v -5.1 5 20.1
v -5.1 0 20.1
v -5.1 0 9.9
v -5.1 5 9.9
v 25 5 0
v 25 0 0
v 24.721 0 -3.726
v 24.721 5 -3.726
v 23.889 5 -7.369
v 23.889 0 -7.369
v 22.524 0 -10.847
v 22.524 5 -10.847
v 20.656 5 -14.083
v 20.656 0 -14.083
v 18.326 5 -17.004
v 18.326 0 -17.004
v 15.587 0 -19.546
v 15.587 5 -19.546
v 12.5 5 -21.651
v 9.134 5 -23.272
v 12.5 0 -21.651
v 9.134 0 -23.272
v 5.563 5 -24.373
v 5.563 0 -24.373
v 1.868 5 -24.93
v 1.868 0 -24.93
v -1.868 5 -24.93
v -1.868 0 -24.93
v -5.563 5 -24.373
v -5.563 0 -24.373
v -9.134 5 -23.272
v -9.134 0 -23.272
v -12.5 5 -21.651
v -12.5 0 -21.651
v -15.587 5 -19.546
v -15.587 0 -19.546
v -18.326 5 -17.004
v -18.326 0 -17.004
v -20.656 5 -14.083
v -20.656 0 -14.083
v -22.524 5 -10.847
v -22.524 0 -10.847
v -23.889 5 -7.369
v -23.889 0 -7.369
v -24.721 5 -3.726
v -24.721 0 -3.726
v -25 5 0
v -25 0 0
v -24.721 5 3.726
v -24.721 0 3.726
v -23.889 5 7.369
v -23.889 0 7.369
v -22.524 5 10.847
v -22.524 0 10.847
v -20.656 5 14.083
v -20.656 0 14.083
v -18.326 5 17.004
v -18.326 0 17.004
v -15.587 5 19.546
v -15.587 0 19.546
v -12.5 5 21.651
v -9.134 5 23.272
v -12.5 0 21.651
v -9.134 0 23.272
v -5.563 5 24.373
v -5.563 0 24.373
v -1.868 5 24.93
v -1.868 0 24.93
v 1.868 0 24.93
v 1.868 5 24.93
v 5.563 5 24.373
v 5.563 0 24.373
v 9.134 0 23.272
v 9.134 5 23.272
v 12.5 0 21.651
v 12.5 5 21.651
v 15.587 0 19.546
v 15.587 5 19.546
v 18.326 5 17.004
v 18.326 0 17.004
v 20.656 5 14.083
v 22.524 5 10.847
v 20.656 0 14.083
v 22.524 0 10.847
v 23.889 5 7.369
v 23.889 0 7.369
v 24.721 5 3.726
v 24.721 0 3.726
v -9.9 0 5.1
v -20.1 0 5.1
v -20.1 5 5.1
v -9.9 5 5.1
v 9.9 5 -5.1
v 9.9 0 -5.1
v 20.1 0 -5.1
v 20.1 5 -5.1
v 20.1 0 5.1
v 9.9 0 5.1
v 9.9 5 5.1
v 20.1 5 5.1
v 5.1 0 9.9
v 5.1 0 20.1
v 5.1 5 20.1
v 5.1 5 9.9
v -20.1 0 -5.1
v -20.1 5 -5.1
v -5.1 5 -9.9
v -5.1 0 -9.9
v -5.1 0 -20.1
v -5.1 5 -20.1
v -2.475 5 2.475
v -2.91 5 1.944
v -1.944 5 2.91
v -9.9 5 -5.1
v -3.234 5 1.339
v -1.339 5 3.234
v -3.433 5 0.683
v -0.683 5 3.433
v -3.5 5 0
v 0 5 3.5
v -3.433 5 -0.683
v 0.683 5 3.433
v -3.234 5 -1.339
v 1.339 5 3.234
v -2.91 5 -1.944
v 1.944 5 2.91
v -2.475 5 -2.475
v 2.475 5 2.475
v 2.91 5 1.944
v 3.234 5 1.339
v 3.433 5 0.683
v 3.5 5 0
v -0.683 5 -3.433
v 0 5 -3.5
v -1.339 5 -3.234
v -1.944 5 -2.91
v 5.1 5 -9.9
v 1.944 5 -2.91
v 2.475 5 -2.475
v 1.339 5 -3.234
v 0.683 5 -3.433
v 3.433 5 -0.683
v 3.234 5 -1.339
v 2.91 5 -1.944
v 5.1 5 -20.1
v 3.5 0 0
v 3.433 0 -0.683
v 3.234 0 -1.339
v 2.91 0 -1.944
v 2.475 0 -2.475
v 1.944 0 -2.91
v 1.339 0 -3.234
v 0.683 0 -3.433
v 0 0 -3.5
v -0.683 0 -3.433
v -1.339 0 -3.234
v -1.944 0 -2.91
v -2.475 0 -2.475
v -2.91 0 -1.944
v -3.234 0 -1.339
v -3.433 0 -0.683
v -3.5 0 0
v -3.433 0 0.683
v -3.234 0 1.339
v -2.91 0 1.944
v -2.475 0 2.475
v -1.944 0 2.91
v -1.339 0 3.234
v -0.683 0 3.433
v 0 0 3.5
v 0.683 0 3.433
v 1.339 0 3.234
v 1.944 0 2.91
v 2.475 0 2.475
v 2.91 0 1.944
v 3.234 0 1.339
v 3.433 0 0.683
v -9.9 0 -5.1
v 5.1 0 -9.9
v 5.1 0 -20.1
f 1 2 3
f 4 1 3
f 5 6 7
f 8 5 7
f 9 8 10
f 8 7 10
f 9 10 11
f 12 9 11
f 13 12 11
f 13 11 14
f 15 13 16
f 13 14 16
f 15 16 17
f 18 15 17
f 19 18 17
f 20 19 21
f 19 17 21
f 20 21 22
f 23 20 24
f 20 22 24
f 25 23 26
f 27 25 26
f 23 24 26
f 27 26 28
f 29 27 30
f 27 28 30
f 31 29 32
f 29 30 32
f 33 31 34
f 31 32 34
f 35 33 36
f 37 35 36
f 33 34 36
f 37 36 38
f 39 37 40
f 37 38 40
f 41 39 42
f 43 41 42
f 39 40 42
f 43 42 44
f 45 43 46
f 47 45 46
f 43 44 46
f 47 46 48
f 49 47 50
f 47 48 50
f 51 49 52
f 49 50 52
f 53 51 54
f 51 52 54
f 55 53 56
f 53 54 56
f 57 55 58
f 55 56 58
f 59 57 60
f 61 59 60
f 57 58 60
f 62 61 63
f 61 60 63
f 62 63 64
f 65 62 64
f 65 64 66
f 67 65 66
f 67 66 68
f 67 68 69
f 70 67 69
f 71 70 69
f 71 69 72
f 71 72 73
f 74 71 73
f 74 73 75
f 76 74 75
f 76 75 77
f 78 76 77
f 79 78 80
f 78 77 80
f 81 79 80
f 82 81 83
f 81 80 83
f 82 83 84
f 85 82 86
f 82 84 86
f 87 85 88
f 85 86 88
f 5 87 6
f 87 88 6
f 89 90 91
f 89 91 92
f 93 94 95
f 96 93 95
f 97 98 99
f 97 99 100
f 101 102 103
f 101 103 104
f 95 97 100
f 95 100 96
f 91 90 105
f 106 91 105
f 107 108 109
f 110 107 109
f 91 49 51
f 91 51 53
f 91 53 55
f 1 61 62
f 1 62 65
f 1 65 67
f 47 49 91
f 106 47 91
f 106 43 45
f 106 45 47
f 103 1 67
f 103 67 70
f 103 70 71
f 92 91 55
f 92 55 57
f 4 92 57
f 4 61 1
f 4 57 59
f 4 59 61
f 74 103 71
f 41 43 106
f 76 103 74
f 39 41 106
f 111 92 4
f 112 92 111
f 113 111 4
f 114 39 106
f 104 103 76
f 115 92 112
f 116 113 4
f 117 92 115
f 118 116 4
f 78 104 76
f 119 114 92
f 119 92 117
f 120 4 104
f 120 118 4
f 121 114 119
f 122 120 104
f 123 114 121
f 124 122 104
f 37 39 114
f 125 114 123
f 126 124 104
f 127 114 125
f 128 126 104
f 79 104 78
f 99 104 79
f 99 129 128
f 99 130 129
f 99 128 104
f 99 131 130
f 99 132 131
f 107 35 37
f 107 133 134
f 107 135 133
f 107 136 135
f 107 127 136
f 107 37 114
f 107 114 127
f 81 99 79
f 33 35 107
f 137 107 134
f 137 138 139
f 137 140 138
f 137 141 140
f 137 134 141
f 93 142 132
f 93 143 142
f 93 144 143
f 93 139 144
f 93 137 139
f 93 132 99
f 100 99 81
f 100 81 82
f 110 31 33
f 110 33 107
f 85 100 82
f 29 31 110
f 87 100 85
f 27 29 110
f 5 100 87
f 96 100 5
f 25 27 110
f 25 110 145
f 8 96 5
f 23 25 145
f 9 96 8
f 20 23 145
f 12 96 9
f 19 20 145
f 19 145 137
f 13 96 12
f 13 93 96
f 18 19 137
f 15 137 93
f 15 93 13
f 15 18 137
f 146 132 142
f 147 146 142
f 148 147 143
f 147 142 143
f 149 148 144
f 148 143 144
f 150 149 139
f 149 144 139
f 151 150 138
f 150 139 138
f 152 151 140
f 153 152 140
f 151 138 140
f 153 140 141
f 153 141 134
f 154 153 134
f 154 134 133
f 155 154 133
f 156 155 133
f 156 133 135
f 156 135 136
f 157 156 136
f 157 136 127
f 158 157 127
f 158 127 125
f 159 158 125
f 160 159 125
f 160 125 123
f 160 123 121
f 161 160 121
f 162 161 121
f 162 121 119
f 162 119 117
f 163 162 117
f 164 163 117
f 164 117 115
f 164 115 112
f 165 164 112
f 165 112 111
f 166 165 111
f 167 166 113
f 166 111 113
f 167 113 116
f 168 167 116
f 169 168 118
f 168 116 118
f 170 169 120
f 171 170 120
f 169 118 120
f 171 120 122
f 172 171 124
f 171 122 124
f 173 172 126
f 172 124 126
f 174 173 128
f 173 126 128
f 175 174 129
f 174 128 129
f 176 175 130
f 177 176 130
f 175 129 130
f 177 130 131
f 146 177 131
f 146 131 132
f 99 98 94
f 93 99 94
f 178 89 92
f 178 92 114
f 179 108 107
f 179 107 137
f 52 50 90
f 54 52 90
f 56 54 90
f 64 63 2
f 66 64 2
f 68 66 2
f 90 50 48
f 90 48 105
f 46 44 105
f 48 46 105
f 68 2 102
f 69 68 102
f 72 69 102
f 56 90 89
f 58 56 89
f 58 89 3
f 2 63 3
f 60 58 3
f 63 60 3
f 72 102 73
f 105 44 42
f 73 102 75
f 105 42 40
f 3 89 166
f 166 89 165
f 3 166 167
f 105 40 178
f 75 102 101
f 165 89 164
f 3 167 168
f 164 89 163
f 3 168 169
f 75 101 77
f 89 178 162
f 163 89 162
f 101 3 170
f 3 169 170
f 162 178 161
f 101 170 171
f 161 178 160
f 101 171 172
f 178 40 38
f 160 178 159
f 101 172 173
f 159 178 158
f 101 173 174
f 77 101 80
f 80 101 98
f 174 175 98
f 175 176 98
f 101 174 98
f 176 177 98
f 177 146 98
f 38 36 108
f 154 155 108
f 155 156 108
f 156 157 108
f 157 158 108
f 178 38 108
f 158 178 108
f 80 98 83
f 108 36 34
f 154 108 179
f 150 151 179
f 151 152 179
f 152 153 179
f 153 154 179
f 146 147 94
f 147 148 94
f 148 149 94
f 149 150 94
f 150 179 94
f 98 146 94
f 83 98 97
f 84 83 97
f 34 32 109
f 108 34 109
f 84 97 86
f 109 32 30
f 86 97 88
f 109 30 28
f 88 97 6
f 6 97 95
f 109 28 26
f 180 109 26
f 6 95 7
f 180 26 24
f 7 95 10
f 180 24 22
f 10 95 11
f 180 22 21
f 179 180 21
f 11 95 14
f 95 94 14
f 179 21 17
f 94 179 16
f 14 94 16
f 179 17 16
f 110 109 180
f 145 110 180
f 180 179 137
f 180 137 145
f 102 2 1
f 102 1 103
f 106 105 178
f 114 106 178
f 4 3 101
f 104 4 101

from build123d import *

# Parameters (mm, degrees)
CROQUIS1_R              = 25
CROQUIS1_W              = 10.2
CROQUIS1_H              = 10.2
SALIENTE_EXTRUIR1_DEPTH = 5
CROQUIS2_R              = 3.5
CORTAR_EXTRUIR1_DEPTH   = 47


with BuildPart() as part:
    # Croquis1 → Saliente-Extruir1 (new body)
    with BuildSketch(Plane(origin=(0, 0, 0), x_dir=(1, 0, 0), z_dir=(0, 1, 0))):
        Circle(CROQUIS1_R)
        with Locations((-15, 0)):
            Rectangle(CROQUIS1_W, CROQUIS1_H, mode=Mode.SUBTRACT)
        with Locations((15, 0)):
            Rectangle(CROQUIS1_W, CROQUIS1_H, mode=Mode.SUBTRACT)
        with Locations((0, 15)):
            Rectangle(CROQUIS1_W, CROQUIS1_H, mode=Mode.SUBTRACT)
        with Locations((0, -15)):
            Rectangle(CROQUIS1_W, CROQUIS1_H, mode=Mode.SUBTRACT)
    extrude(amount=SALIENTE_EXTRUIR1_DEPTH)

    # Croquis2 → Cortar-Extruir1 (cut)
    with BuildSketch(Plane(origin=(0, 5, 0), x_dir=(1, 0, 0), z_dir=(0, 1, 0))):
        Circle(CROQUIS2_R)
    extrude(amount=-CORTAR_EXTRUIR1_DEPTH, mode=Mode.SUBTRACT)


solid = part.part
